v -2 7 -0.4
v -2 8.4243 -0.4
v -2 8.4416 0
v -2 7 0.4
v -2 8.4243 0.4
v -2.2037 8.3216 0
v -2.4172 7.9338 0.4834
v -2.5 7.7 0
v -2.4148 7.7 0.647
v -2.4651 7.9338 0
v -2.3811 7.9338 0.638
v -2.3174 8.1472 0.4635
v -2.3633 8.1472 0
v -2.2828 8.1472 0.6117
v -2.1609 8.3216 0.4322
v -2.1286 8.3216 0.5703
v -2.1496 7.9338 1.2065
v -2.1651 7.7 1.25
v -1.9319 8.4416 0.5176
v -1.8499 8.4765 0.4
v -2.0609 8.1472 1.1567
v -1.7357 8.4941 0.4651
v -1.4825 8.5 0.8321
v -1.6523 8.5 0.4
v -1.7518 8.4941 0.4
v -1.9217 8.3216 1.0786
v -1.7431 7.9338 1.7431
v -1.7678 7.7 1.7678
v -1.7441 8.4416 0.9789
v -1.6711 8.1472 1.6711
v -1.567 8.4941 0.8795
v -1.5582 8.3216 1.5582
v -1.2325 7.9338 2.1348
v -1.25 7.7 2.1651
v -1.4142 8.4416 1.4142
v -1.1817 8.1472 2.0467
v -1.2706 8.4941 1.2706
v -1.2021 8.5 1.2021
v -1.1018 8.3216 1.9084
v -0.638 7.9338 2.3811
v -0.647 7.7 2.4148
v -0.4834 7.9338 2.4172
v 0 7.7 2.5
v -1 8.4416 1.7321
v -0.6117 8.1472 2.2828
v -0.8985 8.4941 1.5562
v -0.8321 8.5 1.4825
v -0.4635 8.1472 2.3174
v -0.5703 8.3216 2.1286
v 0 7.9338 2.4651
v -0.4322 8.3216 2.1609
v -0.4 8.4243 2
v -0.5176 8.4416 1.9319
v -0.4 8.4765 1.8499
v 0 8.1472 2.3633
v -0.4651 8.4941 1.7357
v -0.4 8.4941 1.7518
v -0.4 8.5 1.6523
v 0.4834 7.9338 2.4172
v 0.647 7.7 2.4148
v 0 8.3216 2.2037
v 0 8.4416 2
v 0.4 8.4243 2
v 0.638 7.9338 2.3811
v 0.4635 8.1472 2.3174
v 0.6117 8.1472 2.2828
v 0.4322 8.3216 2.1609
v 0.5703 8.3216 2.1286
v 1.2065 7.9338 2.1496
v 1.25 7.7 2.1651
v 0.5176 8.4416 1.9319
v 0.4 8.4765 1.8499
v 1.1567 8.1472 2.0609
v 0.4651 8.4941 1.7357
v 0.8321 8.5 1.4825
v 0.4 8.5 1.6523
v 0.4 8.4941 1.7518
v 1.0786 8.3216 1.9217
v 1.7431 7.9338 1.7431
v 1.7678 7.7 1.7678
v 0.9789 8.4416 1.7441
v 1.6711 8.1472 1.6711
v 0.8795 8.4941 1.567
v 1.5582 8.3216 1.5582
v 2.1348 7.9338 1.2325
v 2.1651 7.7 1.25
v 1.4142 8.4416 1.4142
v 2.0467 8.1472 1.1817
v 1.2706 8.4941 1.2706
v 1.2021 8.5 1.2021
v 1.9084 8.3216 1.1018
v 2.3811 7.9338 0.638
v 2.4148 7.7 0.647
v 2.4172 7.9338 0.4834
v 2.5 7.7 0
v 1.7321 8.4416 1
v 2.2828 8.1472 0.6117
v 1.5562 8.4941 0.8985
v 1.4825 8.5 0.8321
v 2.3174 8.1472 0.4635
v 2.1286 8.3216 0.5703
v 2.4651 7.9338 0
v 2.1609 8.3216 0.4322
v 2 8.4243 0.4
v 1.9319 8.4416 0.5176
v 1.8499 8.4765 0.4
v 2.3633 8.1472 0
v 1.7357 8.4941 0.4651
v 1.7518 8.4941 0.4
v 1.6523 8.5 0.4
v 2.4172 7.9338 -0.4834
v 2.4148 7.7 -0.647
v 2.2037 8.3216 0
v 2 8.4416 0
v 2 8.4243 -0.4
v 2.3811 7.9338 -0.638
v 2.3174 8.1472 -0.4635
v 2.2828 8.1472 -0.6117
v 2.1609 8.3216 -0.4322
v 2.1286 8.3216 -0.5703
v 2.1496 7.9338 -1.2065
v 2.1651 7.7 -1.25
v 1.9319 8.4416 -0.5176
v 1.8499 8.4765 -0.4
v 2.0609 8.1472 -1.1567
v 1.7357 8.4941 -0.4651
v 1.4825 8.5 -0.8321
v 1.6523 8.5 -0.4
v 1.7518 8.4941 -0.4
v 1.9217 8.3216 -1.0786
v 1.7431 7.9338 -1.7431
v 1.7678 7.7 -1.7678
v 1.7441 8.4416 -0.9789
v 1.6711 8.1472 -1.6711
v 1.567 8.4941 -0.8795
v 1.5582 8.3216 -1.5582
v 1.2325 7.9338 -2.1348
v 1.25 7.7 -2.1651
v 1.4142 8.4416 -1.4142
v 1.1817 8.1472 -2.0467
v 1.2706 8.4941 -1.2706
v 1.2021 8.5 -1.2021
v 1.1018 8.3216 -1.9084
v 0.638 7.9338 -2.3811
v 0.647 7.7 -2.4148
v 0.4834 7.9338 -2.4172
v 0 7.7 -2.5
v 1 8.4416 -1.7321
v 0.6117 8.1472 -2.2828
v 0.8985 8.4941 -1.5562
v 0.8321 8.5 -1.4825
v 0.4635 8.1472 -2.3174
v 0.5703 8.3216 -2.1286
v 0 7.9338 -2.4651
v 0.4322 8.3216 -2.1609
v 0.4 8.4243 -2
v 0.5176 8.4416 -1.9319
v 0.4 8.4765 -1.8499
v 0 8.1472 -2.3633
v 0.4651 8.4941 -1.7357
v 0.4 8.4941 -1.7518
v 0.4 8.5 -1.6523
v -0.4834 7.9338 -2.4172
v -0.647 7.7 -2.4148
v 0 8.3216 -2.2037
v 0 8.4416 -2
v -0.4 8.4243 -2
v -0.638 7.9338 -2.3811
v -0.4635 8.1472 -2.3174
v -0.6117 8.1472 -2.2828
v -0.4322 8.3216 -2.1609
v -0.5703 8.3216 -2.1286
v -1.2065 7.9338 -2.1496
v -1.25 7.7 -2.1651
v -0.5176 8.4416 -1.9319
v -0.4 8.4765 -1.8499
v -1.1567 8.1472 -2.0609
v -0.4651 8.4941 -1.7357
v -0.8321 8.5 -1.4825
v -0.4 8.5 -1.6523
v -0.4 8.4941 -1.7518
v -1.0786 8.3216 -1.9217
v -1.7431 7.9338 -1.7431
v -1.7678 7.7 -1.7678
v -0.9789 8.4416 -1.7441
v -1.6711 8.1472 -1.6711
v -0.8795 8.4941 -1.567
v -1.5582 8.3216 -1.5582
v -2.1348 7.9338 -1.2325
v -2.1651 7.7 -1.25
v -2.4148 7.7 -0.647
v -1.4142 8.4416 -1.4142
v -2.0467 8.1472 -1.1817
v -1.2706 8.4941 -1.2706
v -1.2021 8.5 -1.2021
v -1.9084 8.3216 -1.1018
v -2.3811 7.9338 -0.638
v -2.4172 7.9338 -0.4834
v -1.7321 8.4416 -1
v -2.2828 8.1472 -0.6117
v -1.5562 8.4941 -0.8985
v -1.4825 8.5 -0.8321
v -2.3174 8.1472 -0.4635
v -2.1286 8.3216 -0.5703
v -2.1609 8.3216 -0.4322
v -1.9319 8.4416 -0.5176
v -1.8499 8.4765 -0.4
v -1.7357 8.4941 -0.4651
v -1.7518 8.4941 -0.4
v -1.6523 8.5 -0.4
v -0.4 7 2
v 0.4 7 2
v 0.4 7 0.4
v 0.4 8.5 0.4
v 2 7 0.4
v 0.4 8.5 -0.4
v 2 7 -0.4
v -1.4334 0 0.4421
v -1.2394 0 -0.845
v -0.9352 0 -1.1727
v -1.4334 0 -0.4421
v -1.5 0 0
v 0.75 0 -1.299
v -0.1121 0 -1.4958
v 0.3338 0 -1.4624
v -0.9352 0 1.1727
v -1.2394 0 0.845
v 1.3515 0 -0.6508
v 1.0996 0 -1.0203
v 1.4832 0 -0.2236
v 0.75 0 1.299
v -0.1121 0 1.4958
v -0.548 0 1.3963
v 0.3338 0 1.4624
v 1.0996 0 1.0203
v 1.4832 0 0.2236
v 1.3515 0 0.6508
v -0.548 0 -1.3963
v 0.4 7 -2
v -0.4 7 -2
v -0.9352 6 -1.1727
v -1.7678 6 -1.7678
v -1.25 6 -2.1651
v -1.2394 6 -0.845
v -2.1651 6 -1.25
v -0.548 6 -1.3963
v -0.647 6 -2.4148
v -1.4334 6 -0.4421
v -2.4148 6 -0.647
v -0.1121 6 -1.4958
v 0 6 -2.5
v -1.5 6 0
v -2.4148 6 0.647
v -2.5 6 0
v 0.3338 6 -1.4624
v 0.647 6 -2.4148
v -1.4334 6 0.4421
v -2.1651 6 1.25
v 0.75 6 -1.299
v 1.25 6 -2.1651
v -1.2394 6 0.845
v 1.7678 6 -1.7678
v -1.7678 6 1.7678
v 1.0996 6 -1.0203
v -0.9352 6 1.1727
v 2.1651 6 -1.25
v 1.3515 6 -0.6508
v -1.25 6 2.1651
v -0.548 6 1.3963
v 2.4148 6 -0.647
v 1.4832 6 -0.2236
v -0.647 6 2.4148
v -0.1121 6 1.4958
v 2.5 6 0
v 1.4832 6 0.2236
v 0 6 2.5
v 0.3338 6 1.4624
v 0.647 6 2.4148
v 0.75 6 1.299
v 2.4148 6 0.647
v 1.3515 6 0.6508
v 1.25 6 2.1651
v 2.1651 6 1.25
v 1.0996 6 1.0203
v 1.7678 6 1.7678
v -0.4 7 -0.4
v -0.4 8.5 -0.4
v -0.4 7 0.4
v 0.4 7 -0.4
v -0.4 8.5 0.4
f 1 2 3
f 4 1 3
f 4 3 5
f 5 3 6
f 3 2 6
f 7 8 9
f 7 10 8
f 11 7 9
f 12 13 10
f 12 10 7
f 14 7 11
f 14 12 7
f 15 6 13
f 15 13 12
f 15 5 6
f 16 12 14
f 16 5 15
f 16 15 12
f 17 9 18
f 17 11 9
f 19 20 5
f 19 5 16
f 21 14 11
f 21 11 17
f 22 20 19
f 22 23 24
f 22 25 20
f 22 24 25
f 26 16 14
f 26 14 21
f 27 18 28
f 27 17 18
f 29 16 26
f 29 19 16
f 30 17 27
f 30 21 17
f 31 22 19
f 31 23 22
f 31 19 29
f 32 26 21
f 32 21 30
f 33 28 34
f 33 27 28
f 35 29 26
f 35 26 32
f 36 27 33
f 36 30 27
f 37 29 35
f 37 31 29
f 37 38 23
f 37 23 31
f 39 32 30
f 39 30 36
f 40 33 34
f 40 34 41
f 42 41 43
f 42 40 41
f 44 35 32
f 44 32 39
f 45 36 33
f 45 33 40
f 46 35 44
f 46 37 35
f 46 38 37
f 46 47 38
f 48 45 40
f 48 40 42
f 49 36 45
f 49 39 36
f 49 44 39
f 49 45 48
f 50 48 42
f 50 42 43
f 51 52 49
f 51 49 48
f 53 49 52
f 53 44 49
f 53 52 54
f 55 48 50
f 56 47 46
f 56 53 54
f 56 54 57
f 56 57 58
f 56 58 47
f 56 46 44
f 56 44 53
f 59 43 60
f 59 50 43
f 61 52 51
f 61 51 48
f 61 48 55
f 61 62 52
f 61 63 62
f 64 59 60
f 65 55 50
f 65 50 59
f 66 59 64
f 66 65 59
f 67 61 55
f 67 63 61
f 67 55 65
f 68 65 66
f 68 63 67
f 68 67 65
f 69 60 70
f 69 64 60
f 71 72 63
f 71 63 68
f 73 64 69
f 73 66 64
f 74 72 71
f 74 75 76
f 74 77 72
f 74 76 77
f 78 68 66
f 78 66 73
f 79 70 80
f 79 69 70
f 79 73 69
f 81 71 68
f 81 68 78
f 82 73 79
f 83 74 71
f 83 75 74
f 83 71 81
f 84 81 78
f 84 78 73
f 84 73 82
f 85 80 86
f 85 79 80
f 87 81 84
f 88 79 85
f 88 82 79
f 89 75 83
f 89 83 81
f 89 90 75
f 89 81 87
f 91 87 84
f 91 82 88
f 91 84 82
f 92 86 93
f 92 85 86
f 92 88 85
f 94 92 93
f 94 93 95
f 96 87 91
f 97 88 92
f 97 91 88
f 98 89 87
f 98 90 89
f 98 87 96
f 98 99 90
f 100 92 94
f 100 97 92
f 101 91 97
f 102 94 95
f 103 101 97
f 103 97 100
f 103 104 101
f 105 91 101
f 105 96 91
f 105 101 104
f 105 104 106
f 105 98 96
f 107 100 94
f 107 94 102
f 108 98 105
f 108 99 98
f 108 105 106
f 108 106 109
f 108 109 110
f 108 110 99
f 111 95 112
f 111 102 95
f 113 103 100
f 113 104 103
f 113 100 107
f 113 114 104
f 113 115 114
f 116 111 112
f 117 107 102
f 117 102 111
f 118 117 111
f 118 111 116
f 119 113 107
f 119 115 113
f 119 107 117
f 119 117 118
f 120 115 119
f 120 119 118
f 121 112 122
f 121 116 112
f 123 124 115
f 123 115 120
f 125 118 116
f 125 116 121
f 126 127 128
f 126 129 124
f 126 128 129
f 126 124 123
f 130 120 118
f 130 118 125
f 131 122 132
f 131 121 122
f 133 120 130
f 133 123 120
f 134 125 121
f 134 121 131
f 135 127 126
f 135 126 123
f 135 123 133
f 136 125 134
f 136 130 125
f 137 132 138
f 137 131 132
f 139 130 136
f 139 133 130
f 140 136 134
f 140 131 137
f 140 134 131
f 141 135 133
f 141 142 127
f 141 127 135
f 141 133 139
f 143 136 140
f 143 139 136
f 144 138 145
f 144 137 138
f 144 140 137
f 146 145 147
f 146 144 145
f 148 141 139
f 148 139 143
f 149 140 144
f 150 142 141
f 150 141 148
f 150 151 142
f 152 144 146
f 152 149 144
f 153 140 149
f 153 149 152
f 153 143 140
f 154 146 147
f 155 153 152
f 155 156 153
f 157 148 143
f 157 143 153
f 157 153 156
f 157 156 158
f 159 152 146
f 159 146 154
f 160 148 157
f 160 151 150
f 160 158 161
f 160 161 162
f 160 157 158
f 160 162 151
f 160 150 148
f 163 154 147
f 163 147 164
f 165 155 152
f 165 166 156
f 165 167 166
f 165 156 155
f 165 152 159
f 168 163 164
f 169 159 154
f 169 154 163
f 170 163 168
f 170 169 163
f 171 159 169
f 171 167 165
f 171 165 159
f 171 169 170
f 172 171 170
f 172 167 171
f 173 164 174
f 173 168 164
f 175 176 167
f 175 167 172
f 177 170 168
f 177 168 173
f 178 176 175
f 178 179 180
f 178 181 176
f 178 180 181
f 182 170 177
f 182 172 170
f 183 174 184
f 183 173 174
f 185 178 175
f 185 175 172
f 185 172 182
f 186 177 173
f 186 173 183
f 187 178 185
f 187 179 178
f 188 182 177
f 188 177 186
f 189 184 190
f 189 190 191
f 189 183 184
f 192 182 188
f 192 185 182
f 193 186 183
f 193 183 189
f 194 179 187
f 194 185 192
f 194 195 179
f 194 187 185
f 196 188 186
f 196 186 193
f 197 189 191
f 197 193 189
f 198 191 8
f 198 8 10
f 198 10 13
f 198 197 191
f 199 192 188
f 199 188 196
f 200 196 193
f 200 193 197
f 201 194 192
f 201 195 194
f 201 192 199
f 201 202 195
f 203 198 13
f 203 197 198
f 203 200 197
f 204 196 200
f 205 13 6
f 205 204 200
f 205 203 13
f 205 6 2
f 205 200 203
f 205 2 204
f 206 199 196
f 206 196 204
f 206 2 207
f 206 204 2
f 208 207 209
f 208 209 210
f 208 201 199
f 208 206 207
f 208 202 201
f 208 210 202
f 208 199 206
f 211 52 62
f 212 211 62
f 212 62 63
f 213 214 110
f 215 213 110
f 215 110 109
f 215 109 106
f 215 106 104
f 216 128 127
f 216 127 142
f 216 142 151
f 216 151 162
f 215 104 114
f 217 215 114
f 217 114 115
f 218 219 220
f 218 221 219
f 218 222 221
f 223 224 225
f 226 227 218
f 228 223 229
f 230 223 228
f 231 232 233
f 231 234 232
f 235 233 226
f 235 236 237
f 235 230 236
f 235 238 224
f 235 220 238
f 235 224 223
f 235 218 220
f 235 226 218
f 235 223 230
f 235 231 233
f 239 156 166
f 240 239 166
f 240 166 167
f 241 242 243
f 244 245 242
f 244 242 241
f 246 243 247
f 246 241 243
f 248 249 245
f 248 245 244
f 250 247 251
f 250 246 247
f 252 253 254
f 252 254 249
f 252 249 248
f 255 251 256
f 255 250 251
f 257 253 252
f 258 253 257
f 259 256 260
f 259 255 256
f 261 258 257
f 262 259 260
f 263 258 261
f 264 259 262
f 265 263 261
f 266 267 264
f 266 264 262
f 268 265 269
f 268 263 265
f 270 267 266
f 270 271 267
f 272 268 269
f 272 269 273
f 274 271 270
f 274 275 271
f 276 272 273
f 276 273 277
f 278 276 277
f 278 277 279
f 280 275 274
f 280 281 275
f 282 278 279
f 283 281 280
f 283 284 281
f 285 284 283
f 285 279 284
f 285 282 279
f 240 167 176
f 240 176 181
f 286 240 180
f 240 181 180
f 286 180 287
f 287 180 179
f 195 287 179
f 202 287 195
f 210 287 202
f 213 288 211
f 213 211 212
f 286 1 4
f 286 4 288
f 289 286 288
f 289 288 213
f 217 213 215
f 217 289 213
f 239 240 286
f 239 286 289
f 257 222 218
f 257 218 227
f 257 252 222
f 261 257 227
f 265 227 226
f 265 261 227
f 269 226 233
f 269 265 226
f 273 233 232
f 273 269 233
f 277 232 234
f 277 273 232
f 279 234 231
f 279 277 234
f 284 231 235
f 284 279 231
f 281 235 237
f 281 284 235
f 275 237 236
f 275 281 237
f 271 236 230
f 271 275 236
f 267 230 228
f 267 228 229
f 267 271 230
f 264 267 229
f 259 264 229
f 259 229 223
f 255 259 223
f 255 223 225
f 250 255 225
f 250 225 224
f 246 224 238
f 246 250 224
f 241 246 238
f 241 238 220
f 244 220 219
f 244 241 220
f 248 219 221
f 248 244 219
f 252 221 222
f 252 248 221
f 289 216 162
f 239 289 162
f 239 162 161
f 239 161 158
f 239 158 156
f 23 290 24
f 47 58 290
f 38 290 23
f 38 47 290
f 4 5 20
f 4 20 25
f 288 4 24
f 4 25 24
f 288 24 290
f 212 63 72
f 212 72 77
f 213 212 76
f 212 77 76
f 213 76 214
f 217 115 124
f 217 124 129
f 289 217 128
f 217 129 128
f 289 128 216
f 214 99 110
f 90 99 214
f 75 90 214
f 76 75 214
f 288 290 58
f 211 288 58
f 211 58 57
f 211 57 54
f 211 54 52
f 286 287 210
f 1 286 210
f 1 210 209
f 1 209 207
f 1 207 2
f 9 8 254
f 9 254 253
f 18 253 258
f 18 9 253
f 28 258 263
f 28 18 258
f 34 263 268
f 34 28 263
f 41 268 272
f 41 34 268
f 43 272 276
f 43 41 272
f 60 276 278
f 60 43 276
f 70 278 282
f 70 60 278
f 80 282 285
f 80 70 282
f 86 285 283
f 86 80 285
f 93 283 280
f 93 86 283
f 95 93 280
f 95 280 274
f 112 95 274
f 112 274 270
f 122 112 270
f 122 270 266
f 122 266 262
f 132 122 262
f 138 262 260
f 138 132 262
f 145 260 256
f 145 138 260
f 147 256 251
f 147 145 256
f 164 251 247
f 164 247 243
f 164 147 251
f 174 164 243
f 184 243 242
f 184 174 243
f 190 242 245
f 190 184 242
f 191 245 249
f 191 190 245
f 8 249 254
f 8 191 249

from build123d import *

# Parameters (mm, degrees)
REDONDEO1_R           = 0.8
CORTAR_EXTRUIR1_DEPTH = 1.5


with BuildPart() as part:
    # Croquis1 → Revolución1 (revolve)
    with BuildSketch(Plane.XY):
        Polygon((0, 0), (-1.5, 0), (-1.5, 6), (-2.5, 6), (-2.5, 8.5), (0, 8.5), align=None)
    revolve(axis=Axis((0, 0, 0), (0, 1, 0)))

    # Redondeo1
    redondeo1_edges = [part.edges().sort_by_distance(p)[0] for p in [
        (2.5, 8.5, 0),
    ]]
    fillet(redondeo1_edges, radius=REDONDEO1_R)

    # Croquis2 → Cortar-Extruir1 (cut)
    with BuildSketch(Plane(origin=(0, 8.5, 0), x_dir=(1, 0, 0), z_dir=(0, 1, 0))):
        Polygon((0.4, -2), (0.4, -0.4), (2, -0.4), (2, 0.4), (0.4, 0.4), (0.4, 2), (-0.4, 2), (-0.4, 0.4), (-2, 0.4), (-2, -0.4), (-0.4, -0.4), (-0.4, -2), align=None)
    extrude(amount=-CORTAR_EXTRUIR1_DEPTH, mode=Mode.SUBTRACT)


solid = part.part
